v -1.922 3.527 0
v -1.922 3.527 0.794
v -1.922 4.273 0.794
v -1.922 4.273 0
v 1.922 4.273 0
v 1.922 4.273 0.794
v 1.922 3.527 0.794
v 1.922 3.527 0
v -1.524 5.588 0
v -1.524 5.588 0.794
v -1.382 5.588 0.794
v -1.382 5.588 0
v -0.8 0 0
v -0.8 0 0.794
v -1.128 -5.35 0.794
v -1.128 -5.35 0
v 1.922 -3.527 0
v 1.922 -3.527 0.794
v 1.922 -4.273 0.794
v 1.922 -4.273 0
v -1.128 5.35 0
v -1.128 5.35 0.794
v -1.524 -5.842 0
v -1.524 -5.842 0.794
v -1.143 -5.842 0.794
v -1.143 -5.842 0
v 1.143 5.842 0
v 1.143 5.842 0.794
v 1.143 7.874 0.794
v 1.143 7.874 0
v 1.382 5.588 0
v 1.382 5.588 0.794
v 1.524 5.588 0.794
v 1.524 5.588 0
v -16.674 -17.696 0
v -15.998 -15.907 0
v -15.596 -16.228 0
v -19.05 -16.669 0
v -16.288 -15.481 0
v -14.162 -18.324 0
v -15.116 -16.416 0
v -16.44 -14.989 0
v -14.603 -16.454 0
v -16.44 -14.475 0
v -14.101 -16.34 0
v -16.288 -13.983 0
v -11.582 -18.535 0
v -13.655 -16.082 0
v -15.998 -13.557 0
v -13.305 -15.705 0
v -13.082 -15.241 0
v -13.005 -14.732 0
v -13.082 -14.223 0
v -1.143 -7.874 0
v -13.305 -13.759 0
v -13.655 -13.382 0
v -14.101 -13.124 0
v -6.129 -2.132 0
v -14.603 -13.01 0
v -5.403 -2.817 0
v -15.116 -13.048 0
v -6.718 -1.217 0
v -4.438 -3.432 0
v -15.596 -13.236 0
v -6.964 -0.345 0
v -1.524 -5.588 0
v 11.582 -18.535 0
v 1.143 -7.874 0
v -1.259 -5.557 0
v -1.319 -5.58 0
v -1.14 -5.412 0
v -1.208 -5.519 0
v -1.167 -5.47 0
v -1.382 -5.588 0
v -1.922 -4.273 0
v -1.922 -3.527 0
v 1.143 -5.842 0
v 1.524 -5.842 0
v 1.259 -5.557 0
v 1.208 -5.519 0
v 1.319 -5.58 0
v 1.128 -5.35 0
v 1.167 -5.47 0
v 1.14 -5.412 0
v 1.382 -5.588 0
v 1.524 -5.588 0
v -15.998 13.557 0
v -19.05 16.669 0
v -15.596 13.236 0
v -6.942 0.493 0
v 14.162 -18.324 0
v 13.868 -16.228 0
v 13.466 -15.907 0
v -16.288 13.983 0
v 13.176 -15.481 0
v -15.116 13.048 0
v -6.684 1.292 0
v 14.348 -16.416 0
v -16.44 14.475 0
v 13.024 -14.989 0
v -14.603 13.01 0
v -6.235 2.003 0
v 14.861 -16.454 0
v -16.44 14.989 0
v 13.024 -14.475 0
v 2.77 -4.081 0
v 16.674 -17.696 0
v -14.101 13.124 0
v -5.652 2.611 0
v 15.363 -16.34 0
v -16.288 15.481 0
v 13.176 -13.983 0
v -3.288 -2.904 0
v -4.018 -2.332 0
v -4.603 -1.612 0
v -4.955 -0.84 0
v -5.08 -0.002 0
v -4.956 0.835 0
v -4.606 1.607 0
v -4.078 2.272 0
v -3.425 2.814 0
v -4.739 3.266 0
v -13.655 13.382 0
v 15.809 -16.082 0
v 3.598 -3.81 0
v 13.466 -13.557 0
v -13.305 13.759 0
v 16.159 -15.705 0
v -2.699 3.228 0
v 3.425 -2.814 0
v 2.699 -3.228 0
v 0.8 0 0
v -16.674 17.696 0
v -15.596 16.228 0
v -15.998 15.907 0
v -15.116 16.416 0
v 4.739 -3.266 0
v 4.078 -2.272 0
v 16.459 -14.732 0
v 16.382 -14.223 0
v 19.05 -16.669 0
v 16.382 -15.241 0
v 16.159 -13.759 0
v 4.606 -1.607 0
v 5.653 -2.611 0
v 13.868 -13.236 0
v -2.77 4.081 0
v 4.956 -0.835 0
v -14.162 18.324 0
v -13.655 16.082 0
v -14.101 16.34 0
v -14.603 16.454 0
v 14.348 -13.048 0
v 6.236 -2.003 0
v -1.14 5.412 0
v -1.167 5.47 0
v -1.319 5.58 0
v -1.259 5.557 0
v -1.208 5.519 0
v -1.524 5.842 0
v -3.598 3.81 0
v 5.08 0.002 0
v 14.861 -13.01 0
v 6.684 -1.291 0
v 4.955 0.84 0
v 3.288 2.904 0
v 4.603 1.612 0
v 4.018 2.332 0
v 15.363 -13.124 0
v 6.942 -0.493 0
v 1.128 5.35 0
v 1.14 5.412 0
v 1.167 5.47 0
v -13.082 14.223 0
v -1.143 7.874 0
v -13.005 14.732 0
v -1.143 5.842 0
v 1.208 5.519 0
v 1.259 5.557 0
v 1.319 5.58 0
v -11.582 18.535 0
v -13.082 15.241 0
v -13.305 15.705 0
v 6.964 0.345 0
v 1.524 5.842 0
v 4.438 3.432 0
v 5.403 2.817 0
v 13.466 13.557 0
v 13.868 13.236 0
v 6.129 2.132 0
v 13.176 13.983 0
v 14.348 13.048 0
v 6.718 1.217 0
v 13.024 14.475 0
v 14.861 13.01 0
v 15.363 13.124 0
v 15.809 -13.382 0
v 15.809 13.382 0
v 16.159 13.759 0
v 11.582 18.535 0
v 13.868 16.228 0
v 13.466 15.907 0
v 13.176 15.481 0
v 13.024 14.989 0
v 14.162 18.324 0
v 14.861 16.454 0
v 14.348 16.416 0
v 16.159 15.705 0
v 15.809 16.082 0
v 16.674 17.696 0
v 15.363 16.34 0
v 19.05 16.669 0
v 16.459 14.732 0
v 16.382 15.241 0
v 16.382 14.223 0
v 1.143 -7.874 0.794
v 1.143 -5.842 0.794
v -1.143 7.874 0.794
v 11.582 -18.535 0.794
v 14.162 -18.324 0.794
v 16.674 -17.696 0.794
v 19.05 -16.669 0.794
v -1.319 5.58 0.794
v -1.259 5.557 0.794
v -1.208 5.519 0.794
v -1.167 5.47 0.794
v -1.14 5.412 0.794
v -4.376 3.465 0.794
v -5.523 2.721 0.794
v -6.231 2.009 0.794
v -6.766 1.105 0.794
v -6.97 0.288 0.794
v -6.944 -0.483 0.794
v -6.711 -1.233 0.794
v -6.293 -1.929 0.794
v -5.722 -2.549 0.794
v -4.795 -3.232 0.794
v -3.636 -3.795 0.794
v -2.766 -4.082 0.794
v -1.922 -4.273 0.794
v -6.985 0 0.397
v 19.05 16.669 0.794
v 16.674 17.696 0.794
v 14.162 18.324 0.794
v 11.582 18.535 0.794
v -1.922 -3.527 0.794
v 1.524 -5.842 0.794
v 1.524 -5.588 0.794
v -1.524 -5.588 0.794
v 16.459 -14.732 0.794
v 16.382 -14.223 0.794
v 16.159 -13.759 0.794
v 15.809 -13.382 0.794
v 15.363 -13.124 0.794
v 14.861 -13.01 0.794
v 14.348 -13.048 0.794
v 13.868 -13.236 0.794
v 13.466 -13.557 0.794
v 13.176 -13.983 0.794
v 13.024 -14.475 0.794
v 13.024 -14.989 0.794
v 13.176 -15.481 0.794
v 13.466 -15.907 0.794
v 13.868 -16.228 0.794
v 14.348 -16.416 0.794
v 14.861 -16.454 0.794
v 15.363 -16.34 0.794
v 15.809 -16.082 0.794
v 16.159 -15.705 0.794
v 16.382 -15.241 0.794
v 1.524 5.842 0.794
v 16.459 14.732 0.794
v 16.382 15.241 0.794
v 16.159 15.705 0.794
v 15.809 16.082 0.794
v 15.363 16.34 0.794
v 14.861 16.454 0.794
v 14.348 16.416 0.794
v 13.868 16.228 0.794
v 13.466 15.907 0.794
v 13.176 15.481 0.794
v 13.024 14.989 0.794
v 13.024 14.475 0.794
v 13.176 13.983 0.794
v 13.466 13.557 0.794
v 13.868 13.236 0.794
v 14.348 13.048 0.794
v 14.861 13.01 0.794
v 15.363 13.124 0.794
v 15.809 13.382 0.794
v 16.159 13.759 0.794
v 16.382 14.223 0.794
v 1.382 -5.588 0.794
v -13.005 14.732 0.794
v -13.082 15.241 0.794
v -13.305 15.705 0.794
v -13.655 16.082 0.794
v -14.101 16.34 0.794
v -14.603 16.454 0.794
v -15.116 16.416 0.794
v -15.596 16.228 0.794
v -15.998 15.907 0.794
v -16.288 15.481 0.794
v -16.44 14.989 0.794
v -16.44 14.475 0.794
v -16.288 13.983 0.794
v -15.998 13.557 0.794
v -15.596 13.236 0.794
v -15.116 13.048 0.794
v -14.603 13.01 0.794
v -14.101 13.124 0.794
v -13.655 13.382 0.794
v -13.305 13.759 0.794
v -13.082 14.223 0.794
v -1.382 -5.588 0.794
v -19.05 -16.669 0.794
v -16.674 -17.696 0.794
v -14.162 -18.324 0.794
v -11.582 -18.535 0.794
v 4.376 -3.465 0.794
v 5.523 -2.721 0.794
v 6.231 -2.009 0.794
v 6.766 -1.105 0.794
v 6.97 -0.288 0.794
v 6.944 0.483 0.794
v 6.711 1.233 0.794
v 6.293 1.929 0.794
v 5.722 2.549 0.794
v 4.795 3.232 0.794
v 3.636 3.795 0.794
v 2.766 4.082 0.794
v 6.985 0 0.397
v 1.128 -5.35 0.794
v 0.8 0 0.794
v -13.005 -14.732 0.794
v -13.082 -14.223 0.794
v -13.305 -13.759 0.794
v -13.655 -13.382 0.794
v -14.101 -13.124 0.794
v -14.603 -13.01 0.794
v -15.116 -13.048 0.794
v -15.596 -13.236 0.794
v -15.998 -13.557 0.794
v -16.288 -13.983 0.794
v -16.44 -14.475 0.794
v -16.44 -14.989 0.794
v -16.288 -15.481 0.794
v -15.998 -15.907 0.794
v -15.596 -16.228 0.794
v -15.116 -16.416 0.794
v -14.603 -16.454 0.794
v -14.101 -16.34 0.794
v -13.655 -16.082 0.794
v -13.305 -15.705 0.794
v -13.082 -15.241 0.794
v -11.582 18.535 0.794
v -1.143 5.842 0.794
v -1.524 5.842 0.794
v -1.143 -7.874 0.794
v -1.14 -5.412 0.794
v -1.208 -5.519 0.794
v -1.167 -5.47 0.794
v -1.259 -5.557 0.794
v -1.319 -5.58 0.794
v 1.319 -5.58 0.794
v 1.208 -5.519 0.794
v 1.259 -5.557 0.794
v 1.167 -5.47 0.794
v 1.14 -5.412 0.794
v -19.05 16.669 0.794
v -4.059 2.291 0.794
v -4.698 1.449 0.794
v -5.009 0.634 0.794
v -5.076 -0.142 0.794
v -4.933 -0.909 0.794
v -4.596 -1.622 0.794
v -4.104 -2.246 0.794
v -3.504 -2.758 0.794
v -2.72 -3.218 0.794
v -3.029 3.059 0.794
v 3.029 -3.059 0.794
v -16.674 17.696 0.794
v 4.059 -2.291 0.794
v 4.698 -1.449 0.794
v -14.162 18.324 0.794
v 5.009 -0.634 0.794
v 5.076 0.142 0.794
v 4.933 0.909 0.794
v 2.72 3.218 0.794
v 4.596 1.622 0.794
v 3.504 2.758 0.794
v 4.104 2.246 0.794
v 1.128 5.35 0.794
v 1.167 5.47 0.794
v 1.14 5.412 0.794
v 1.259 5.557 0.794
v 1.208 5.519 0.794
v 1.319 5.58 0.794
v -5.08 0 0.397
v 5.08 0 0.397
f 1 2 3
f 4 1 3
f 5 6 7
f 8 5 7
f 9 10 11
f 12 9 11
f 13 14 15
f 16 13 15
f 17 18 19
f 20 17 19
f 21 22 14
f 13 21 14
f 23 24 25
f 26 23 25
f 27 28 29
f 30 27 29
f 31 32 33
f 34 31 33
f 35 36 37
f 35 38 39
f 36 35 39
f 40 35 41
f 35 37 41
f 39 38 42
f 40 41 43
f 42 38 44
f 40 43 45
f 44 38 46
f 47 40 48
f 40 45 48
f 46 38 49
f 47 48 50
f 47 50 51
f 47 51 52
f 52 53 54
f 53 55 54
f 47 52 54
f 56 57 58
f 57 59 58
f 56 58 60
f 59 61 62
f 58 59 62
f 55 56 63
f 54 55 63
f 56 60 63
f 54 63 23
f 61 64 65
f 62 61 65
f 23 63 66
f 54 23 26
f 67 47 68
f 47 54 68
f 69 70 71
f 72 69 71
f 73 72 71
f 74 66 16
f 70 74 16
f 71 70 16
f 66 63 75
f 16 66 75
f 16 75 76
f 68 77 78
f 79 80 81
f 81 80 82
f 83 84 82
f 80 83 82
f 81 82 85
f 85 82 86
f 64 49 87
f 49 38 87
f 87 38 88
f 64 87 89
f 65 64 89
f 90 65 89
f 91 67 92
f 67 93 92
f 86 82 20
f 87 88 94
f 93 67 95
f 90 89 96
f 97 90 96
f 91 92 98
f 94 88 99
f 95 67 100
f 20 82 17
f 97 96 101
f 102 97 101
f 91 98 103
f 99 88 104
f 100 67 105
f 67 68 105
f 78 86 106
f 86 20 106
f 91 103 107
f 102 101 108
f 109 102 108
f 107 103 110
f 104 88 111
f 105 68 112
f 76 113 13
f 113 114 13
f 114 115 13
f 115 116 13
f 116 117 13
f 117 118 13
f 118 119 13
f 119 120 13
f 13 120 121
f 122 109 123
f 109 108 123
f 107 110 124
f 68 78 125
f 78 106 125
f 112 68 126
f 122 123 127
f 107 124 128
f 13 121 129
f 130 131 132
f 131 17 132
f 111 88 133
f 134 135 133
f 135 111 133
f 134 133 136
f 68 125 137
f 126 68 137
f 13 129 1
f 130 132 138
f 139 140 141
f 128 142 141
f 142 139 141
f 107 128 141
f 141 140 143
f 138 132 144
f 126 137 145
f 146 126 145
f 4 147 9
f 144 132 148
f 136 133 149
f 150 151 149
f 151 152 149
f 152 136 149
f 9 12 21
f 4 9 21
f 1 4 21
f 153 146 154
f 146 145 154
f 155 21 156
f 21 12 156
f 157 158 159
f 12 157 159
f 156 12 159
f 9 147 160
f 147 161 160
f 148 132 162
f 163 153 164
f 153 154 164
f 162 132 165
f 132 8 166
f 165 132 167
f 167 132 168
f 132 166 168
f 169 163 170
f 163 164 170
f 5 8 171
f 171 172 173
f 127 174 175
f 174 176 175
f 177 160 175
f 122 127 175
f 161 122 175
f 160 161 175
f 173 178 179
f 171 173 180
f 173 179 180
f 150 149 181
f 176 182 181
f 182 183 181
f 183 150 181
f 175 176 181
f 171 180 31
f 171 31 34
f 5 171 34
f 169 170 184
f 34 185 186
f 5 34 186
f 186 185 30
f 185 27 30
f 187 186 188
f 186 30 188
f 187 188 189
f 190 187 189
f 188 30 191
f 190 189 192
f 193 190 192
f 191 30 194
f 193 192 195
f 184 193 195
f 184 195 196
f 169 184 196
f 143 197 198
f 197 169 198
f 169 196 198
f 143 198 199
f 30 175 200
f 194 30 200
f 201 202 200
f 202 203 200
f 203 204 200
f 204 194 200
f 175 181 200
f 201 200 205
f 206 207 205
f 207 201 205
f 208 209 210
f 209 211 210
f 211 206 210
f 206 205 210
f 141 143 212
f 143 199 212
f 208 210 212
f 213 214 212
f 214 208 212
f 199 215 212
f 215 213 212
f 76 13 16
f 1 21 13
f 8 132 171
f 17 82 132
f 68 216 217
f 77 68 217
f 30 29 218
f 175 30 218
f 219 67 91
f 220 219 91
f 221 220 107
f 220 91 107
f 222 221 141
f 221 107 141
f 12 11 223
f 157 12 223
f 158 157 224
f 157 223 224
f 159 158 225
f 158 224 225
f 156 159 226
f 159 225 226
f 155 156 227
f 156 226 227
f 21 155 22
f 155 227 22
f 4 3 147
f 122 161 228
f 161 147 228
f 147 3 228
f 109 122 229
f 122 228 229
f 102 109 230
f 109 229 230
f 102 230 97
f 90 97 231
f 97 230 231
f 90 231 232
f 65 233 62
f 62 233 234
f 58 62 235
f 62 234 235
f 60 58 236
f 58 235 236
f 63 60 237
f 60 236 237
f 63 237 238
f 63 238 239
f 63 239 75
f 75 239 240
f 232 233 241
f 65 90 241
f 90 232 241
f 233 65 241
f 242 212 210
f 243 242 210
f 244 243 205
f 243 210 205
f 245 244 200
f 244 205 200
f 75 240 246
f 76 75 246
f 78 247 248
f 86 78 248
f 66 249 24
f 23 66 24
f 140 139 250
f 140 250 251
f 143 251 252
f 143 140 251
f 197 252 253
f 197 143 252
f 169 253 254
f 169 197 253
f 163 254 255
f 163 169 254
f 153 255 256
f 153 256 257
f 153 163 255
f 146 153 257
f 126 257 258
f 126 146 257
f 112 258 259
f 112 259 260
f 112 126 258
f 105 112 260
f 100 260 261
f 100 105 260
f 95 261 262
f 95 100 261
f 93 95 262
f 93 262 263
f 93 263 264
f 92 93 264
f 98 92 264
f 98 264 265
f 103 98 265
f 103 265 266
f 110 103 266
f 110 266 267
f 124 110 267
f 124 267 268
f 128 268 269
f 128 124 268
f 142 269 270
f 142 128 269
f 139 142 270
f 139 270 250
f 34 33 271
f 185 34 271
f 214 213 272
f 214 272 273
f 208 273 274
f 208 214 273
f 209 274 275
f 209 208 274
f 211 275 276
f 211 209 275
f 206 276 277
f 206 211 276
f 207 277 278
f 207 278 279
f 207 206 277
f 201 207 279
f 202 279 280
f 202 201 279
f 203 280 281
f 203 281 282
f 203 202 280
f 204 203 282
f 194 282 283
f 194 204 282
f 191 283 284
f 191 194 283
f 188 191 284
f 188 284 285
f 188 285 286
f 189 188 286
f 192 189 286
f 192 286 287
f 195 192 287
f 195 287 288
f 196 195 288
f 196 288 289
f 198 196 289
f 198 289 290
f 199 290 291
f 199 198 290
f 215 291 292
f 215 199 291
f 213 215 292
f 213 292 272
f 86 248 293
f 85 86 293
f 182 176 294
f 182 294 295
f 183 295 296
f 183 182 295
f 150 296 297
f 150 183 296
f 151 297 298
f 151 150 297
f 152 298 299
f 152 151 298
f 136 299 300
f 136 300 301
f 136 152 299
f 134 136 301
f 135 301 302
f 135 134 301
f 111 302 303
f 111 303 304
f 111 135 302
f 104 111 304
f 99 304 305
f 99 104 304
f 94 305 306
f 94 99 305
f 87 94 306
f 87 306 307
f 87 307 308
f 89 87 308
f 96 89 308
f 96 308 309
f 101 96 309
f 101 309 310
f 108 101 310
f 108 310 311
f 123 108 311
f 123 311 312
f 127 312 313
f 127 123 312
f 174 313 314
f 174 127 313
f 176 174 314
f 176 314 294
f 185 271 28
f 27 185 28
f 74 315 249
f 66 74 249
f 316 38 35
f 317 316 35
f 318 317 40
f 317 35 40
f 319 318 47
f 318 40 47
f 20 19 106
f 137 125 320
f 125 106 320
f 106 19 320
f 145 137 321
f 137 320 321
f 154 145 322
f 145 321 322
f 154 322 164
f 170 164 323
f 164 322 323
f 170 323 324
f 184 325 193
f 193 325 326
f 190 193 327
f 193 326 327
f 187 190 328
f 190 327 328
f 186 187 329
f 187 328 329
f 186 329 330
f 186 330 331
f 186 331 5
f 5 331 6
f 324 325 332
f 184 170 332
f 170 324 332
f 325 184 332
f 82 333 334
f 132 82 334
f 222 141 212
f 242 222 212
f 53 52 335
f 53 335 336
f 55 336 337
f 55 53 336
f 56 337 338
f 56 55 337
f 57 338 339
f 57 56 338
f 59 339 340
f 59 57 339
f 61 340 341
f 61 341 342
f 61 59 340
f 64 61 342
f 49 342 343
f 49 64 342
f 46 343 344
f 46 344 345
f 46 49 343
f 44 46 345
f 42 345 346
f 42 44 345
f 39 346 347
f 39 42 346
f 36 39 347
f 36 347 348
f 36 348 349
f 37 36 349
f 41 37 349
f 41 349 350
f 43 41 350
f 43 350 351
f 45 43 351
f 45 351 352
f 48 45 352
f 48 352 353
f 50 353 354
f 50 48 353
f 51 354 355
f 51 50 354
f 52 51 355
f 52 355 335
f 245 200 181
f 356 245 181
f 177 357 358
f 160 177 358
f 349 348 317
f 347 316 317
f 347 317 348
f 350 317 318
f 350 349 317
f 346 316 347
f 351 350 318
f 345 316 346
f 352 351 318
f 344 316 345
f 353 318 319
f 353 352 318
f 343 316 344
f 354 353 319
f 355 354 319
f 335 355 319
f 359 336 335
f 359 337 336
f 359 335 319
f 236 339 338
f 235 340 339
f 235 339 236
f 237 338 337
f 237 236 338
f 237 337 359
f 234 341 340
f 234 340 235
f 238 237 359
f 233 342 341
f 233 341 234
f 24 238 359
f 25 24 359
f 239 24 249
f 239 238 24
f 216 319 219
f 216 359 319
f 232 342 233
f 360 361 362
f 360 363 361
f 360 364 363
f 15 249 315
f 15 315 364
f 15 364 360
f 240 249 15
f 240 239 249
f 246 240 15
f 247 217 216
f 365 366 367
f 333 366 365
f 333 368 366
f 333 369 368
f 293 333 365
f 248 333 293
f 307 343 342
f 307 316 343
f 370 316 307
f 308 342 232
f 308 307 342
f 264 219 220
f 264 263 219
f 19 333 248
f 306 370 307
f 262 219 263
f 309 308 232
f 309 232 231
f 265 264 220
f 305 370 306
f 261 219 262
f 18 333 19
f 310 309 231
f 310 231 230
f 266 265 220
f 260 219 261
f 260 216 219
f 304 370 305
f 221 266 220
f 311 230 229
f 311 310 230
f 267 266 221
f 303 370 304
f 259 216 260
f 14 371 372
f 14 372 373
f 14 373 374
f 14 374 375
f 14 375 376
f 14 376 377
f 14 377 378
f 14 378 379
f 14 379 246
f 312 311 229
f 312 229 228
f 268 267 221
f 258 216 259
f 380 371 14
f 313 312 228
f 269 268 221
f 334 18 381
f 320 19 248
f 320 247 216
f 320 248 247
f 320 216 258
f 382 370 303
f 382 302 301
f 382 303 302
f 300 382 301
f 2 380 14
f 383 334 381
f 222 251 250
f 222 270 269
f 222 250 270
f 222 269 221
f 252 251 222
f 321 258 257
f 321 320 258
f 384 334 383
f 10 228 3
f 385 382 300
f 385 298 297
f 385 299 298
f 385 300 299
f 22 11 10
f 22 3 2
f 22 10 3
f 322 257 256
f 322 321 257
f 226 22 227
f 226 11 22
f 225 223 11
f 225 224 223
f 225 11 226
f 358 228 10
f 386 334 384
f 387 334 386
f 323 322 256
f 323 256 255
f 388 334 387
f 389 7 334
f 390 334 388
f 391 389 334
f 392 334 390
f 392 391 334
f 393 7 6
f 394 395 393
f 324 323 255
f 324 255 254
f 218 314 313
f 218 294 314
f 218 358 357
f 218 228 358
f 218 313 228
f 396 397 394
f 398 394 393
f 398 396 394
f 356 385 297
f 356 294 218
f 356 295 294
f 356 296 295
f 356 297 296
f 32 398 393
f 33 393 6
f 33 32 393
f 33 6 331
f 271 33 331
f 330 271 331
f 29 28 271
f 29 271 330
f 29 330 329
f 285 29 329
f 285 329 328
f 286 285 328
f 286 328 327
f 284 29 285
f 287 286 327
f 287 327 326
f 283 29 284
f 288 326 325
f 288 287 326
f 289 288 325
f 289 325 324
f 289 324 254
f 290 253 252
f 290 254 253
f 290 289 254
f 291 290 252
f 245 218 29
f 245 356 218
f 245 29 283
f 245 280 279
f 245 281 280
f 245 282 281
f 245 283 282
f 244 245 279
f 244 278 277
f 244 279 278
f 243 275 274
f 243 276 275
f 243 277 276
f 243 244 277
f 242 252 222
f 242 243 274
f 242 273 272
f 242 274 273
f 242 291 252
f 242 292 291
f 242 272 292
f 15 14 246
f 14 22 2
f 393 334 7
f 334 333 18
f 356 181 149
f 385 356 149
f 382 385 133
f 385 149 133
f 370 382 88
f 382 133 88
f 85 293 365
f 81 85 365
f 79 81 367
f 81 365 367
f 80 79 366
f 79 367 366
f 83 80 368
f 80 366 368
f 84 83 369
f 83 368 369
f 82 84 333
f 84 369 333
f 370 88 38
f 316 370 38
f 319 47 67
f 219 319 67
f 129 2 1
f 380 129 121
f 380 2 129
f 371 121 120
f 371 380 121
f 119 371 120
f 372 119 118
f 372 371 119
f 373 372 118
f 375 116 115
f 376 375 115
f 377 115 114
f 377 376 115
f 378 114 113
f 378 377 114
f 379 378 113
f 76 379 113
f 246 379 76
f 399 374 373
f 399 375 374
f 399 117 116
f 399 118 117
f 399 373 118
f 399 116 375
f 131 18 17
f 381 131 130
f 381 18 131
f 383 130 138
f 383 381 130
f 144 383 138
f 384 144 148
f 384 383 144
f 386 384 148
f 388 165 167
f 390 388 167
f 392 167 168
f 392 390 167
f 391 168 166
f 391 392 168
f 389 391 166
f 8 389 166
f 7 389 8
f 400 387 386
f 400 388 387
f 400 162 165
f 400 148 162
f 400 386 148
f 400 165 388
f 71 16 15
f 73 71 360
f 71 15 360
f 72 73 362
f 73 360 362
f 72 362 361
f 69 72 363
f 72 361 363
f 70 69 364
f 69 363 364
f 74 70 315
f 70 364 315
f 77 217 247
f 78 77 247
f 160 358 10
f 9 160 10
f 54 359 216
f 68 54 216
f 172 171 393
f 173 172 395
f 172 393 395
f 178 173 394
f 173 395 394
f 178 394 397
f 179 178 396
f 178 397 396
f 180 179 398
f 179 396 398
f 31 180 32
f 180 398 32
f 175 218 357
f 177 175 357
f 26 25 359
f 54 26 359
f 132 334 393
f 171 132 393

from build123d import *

# Parameters (mm, degrees)
F0_R     = 1.7272
F1_DEPTH = 0.79375
F3_DEPTH = 25.4


# Not quite as in the source:
# - a feature names something its author has since deleted; it is built from what else it names


with BuildPart() as f1:
    # F0 (on Top) → F1 (new body)
    with BuildSketch(Plane.XY):
        with BuildLine():
            Line((-19.05, 16.66875), (-19.05, 0))
            Line((-19.05, 0), (-19.05, -16.66875))
            ThreePointArc((-19.05, -16.66875), (-15.4310103444, -18.0612265152), (-11.5824, -18.5348037427))
            Line((-11.5824, -18.5348037427), (0, -18.5348037427))
            Line((0, -18.5348037427), (11.5824, -18.5348037427))
            ThreePointArc((11.5824, -18.5348037427), (15.4310103444, -18.0612265152), (19.05, -16.66875))
            Line((19.05, -16.66875), (19.05, 0))
            Line((19.05, 0), (19.05, 16.66875))
            ThreePointArc((19.05, 16.66875), (15.4310103444, 18.0612265152), (11.5824, 18.5348037427))
            Line((11.5824, 18.5348037427), (0, 18.5348037427))
            Line((0, 18.5348037427), (-11.5824, 18.5348037427))
            ThreePointArc((-11.5824, 18.5348037427), (-15.4310103444, 18.0612265152), (-19.05, 16.66875))
        make_face()
        with Locations((-14.732, -14.732)):
            Circle(F0_R, mode=Mode.SUBTRACT)
        with Locations((14.732, -14.732)):
            Circle(F0_R, mode=Mode.SUBTRACT)
        with Locations((-14.732, 14.732)):
            Circle(F0_R, mode=Mode.SUBTRACT)
        with Locations((14.732, 14.732)):
            Circle(F0_R, mode=Mode.SUBTRACT)
    extrude(amount=F1_DEPTH)

    # F2 (on face) → F3 (cut)
    with BuildSketch(Plane.XY.offset(0.79375)):
        with BuildLine():
            Line((-1.381887138, -5.588), (-1.524, -5.588))
            Line((-1.524, -5.588), (-1.524, -5.842))
            Line((-1.524, -5.842), (-1.143, -5.842))
            Line((-1.143, -5.842), (-1.143, -7.874))
            Line((-1.143, -7.874), (0, -7.874))
            Line((0, -7.874), (1.143, -7.874))
            Line((1.143, -7.874), (1.143, -5.842))
            Line((1.143, -5.842), (1.524, -5.842))
            Line((1.524, -5.842), (1.524, -5.588))
            Line((1.524, -5.588), (1.381887138, -5.588))
            ThreePointArc((1.381887138, -5.588), (1.2078708338, -5.5190252033), (1.128364287, -5.349561621))
            Line((1.128364287, -5.349561621), (0.8, 0))
            Line((0.8, 0), (1.128364287, 5.349561621))
            ThreePointArc((1.128364287, 5.349561621), (1.2078708338, 5.5190252033), (1.381887138, 5.588))
            Line((1.381887138, 5.588), (1.524, 5.588))
            Line((1.524, 5.588), (1.524, 5.842))
            Line((1.524, 5.842), (1.143, 5.842))
            Line((1.143, 5.842), (1.143, 7.874))
            Line((1.143, 7.874), (0, 7.874))
            Line((0, 7.874), (-1.143, 7.874))
            Line((-1.143, 7.874), (-1.143, 5.842))
            Line((-1.143, 5.842), (-1.524, 5.842))
            Line((-1.524, 5.842), (-1.524, 5.588))
            Line((-1.524, 5.588), (-1.381887138, 5.588))
            ThreePointArc((-1.381887138, 5.588), (-1.2078708338, 5.5190252033), (-1.128364287, 5.349561621))
            Line((-1.128364287, 5.349561621), (-0.8, 0))
            Line((-0.8, 0), (-1.128364287, -5.349561621))
            ThreePointArc((-1.128364287, -5.349561621), (-1.2078708338, -5.5190252033), (-1.381887138, -5.588))
        make_face()
        with BuildLine():
            add(Edge.make_bspline(
                [(-1.922114287, 3.5267450469), (-13.4260486871, 0), (-1.922114287, -3.5267450469)],
                knots=[1.958829942, 1.958829942, 1.958829942, 4.3243553652, 4.3243553652, 4.3243553652], degree=2, weights=[1, 0.3783689541, 1]))
            Line((-1.922114287, 3.5267450469), (-1.922114287, 4.2733939342))
            add(Edge.make_bspline(
                [(-1.922114287, 4.2733939342), (-25.3836232991, 0), (-1.922114287, -4.2733939342)],
                knots=[1.8495705702, 1.8495705702, 1.8495705702, 4.433614737, 4.433614737, 4.433614737], degree=2, weights=[1, 0.2751774212, 1]))
            Line((-1.922114287, -4.2733939342), (-1.922114287, -3.5267450469))
        make_face()
        with BuildLine():
            Line((1.922114287, 4.2733939342), (1.922114287, 3.5267450469))
            add(Edge.make_bspline(
                [(1.922114287, -3.5267450469), (13.4260486871, 0), (1.922114287, 3.5267450469)],
                knots=[5.1004225956, 5.1004225956, 5.1004225956, 7.4659480188, 7.4659480188, 7.4659480188], degree=2, weights=[1, 0.3783689541, 1]))
            Line((1.922114287, -3.5267450469), (1.922114287, -4.2733939342))
            add(Edge.make_bspline(
                [(1.922114287, -4.2733939342), (25.3836232991, 0), (1.922114287, 4.2733939342)],
                knots=[4.9911632238, 4.9911632238, 4.9911632238, 7.5752073906, 7.5752073906, 7.5752073906], degree=2, weights=[1, 0.2751774212, 1]))
        make_face()
    extrude(amount=-F3_DEPTH, mode=Mode.SUBTRACT)


solid = f1.part
